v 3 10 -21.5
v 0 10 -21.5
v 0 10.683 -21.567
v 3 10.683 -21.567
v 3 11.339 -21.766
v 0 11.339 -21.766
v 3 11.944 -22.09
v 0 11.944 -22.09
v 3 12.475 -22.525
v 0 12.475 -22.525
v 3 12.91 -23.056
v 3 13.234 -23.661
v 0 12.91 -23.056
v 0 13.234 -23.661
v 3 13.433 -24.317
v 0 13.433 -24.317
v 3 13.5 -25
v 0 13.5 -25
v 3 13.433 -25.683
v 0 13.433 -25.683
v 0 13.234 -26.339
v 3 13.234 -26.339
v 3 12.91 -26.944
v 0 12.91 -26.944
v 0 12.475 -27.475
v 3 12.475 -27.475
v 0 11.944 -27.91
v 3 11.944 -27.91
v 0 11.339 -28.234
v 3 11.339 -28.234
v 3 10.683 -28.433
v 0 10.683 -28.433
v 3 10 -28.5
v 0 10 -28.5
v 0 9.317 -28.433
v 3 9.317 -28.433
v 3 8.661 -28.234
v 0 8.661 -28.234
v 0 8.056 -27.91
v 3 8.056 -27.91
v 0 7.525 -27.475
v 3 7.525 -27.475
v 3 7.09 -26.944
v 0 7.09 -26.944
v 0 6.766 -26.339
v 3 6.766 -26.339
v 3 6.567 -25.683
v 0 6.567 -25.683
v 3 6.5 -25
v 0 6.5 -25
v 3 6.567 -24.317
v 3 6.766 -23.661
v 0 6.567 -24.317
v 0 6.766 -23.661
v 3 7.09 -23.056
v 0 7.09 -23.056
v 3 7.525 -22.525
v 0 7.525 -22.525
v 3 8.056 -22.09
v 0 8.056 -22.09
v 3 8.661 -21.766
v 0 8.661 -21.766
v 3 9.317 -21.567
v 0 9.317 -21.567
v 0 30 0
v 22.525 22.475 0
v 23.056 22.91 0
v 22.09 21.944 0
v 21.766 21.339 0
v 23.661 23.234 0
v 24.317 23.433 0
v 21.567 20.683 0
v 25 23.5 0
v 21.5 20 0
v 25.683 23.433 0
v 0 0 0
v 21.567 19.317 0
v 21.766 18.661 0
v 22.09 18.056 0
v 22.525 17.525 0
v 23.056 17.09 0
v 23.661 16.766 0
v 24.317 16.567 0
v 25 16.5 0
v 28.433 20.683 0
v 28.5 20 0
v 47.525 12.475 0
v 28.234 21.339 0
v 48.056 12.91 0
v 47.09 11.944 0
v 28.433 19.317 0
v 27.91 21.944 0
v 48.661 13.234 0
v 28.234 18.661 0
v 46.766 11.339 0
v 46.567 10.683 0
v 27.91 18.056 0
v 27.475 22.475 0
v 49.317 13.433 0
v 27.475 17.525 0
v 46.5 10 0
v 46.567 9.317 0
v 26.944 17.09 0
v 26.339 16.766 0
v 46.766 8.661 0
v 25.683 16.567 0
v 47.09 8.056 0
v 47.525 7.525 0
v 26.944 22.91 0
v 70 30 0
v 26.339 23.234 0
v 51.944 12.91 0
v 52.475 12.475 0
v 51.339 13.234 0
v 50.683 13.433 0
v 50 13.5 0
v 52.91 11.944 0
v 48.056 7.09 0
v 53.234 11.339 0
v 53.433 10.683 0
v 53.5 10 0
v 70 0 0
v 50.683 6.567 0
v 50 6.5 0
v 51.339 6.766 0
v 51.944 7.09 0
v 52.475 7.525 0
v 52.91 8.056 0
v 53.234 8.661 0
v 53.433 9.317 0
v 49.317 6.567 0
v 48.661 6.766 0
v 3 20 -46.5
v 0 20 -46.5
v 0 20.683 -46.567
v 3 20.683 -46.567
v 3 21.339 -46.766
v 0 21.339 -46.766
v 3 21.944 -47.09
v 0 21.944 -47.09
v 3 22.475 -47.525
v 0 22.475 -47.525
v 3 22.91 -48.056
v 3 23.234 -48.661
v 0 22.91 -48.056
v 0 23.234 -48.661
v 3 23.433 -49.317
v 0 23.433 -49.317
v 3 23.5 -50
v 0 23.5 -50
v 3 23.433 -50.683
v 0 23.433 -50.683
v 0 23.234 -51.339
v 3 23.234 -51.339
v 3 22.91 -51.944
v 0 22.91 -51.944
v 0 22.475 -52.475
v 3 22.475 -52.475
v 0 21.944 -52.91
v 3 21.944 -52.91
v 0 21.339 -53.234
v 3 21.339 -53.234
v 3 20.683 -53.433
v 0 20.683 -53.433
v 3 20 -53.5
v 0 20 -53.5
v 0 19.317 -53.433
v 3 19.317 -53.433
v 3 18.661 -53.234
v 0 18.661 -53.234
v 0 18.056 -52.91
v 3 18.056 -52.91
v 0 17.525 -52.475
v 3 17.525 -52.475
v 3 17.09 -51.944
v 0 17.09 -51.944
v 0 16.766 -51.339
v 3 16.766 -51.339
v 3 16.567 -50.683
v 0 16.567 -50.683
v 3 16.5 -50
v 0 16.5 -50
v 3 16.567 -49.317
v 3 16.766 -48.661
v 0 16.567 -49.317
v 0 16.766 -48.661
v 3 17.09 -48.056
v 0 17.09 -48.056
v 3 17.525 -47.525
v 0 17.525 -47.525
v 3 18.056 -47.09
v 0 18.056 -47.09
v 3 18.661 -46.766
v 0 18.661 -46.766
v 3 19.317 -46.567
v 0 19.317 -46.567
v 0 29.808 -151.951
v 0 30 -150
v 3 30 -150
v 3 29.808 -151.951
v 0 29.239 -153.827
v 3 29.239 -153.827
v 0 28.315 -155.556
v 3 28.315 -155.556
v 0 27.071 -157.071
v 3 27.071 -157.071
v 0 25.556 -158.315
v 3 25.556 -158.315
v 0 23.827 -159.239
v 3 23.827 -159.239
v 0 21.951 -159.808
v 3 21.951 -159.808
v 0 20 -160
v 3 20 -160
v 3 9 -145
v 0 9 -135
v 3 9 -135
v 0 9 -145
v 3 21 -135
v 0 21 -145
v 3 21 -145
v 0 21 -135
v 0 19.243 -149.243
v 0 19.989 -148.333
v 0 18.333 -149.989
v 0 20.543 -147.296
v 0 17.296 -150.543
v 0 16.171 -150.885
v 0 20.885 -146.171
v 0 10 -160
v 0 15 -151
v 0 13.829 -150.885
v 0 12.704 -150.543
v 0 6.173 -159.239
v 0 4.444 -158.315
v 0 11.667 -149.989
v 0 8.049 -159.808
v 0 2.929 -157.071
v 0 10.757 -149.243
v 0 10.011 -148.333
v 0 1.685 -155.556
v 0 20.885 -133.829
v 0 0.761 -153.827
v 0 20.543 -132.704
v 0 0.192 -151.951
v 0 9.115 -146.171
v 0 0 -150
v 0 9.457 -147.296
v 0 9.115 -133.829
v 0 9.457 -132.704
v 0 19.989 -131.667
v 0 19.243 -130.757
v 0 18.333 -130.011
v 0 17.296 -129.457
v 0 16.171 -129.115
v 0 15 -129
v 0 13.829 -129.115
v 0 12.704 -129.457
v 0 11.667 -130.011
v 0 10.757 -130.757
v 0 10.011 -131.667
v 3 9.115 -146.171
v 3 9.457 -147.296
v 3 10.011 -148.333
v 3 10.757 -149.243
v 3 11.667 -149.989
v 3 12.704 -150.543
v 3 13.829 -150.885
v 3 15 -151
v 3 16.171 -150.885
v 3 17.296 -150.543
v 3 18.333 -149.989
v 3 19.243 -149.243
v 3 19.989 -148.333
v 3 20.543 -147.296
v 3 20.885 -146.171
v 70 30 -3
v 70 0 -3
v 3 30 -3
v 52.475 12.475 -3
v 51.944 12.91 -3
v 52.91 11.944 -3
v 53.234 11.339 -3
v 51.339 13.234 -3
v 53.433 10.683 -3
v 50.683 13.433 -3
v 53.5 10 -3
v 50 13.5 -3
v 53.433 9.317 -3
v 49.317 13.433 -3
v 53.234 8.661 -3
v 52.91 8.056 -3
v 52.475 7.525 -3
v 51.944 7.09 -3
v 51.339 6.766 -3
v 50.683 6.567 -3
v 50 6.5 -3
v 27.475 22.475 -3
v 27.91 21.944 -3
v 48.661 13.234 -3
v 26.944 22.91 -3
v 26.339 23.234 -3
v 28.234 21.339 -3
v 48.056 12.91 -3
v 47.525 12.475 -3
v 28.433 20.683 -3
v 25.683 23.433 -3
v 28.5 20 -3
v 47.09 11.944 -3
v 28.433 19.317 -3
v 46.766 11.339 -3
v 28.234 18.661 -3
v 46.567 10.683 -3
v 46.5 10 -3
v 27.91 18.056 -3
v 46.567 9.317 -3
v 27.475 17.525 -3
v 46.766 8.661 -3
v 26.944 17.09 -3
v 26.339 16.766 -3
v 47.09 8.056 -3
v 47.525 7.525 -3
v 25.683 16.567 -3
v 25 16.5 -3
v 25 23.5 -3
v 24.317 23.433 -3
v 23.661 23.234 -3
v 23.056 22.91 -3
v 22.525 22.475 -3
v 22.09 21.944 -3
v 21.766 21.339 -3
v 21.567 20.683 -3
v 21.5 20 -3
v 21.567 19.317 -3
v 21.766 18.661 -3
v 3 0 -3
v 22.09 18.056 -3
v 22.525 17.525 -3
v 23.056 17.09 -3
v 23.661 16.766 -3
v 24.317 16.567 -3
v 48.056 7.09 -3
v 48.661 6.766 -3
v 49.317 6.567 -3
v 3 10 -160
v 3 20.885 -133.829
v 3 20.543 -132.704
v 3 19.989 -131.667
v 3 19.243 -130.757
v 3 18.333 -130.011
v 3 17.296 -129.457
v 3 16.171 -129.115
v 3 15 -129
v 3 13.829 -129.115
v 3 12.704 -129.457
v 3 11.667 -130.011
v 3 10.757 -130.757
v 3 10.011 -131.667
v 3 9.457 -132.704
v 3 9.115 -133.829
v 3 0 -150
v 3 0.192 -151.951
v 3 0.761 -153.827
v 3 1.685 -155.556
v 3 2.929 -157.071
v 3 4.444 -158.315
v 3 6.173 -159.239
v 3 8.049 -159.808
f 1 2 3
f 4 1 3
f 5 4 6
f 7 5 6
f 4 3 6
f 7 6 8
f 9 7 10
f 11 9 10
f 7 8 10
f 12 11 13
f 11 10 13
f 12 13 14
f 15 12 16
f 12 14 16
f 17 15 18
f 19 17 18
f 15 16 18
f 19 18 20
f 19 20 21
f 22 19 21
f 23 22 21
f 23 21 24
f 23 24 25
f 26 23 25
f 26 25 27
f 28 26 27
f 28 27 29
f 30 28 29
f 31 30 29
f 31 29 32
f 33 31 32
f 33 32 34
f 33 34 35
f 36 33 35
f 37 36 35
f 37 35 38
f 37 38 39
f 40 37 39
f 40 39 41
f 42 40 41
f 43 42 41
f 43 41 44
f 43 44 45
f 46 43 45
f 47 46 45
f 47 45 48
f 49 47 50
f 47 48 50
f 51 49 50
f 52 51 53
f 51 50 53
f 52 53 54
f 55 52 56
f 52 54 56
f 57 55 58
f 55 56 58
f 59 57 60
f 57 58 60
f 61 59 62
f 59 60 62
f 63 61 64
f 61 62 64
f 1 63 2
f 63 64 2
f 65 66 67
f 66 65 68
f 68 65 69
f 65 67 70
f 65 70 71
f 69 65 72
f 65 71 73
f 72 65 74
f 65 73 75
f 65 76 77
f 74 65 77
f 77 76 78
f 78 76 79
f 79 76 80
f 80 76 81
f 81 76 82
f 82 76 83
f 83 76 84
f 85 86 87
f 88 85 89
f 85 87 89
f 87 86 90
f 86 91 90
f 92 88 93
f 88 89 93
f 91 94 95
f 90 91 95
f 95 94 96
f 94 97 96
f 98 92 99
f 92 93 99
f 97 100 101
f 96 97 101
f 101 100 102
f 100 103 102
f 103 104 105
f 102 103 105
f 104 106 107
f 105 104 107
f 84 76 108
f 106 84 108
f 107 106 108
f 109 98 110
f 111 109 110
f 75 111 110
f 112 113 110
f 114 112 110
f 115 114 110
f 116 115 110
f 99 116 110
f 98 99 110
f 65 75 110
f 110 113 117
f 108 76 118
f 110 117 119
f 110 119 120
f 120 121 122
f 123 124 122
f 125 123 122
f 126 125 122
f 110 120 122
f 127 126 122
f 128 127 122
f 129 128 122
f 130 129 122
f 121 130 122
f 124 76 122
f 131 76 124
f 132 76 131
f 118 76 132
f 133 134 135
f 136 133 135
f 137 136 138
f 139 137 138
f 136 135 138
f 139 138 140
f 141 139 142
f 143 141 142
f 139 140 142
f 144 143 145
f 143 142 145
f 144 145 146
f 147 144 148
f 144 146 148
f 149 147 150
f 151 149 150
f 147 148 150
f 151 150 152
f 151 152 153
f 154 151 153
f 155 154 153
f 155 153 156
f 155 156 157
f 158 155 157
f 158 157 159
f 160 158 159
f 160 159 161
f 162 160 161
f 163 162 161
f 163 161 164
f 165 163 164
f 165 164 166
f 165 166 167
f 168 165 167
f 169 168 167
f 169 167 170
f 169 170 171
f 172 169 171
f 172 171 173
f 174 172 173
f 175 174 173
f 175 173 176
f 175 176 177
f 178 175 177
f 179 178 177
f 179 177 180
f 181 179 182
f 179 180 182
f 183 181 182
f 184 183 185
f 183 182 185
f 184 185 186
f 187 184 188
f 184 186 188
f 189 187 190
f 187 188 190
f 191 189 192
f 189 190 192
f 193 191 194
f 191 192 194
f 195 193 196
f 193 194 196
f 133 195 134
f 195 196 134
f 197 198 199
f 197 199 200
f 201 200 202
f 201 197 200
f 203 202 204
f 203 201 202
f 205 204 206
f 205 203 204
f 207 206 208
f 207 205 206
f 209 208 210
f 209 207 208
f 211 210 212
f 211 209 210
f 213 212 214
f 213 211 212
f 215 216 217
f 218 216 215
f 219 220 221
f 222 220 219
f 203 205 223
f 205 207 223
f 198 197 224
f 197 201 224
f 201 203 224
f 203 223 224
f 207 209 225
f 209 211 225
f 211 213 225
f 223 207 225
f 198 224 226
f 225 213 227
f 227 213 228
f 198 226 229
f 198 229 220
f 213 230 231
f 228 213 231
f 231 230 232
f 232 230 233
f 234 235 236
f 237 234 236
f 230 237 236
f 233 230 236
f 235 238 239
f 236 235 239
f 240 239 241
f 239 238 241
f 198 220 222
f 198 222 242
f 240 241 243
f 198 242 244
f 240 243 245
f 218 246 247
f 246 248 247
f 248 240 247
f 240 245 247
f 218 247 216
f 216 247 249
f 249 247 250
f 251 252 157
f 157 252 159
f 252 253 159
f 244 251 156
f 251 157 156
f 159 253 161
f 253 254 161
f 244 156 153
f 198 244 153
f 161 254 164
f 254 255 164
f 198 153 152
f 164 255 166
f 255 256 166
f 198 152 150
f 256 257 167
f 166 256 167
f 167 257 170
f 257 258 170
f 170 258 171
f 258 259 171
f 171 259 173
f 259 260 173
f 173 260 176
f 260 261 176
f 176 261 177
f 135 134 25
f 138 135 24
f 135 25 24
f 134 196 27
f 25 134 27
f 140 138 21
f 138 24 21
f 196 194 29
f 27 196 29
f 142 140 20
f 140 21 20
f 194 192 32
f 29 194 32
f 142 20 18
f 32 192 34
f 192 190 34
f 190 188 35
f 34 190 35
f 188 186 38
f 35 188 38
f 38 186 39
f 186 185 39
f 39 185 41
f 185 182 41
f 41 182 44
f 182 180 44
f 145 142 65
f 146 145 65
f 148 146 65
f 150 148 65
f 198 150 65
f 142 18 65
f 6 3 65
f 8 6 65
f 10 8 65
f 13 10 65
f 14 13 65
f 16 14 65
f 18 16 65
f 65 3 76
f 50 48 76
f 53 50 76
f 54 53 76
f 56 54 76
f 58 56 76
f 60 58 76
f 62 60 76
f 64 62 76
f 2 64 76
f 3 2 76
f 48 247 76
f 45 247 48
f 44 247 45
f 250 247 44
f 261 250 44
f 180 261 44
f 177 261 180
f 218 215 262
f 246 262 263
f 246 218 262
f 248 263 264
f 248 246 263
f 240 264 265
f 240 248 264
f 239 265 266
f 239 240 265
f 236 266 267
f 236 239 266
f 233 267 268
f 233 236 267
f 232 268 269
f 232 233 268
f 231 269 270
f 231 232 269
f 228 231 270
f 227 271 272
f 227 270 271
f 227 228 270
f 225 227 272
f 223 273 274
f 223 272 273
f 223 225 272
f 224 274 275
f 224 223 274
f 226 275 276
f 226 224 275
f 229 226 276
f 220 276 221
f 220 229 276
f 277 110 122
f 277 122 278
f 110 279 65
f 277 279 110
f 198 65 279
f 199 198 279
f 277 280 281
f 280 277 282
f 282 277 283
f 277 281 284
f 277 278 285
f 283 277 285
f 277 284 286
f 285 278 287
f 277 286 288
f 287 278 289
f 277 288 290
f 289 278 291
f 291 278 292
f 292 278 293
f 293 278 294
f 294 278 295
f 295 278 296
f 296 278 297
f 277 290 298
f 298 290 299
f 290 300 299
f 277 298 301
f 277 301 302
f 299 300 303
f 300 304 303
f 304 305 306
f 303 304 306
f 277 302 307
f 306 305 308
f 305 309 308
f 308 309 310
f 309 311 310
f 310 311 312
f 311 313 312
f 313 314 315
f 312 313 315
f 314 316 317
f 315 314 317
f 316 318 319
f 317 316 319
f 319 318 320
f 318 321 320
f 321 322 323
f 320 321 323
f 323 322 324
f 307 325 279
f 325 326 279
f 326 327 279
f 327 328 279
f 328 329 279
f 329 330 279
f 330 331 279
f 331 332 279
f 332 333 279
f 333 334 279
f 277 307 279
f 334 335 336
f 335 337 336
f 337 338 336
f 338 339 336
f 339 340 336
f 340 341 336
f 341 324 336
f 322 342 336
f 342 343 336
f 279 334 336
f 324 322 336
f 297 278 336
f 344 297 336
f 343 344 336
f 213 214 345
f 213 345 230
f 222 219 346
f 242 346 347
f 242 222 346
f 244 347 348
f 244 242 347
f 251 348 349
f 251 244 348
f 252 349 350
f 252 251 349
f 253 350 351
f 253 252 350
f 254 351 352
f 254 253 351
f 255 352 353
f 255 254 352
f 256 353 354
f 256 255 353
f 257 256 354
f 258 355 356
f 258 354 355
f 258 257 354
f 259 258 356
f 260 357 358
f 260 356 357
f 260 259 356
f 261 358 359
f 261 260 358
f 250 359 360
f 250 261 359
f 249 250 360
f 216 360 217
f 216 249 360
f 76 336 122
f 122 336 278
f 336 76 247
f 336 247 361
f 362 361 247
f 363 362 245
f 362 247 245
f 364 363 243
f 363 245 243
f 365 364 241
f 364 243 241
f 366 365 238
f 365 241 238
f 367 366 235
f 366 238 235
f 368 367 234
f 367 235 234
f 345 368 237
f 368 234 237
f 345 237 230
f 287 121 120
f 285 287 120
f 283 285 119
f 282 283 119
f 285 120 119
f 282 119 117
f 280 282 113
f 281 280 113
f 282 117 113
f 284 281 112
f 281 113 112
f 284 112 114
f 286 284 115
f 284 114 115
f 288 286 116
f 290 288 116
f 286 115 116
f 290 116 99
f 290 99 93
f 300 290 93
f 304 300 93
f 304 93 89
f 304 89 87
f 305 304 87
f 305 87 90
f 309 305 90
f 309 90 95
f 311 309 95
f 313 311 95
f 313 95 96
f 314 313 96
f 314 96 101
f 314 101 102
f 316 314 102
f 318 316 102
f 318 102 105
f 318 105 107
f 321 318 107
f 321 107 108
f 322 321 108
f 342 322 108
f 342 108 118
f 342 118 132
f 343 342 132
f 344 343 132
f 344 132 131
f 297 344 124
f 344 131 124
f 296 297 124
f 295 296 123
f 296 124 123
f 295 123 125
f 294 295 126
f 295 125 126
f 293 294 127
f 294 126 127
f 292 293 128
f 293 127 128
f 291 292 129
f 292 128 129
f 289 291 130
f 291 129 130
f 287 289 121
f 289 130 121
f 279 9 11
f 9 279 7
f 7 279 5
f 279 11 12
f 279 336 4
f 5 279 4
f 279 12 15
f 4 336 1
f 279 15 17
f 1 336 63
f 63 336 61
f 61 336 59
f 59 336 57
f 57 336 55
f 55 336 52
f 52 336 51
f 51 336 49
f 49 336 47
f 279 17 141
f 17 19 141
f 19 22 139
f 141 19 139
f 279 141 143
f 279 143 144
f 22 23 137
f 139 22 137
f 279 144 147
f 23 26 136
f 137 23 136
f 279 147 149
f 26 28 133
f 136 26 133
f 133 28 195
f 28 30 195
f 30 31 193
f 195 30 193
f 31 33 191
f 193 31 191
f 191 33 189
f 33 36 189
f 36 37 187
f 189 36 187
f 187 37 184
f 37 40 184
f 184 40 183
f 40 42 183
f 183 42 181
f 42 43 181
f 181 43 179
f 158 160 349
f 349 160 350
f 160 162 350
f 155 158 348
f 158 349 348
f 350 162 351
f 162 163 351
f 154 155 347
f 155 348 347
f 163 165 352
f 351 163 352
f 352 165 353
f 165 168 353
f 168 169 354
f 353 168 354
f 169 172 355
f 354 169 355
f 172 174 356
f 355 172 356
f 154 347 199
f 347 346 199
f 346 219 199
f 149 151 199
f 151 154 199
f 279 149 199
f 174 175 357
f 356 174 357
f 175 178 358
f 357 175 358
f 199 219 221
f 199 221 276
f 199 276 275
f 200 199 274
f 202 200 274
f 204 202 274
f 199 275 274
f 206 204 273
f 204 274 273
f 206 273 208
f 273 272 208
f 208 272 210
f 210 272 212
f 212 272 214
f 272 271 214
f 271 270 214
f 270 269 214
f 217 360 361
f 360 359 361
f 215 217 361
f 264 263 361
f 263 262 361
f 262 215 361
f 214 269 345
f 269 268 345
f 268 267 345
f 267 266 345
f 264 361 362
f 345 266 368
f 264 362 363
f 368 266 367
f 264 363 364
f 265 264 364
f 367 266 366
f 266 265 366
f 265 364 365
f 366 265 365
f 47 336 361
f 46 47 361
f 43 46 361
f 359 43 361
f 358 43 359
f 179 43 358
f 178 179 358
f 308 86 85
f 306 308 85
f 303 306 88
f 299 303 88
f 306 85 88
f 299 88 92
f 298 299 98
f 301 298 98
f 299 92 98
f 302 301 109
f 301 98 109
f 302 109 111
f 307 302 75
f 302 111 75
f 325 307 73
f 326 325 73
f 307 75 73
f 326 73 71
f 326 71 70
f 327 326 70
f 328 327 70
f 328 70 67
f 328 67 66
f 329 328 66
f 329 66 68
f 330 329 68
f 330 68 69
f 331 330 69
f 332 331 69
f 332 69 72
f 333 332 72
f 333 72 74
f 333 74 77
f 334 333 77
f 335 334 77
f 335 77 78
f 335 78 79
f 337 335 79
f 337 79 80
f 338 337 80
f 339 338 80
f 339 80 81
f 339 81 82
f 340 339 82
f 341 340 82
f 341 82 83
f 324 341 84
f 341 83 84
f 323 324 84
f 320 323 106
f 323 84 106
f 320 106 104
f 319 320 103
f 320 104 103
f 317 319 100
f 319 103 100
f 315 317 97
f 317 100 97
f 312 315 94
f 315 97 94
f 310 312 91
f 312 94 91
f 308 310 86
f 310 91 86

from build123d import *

# Parameters (mm, degrees)
EXTRUDE_1_DEPTH     = 30
SKETCH_2_R          = 3.5
CUT_EXTRUDE_1_DEPTH = 71
SKETCH_3_R          = 3.5
CUT_EXTRUDE_2_DEPTH = 161
CUT_EXTRUDE_3_DEPTH = 71


with BuildPart() as part:
    # Эскиз1 → Вытянуть-Тонкостенный1 (new body)
    with BuildSketch(Plane(origin=(0, 0, 0), x_dir=(1, 0, 0), z_dir=(0, 1, 0))):
        Polygon((0, 160), (0, 120), (0, 0), (70, 0), (70, 3), (3, 3), (3, 120), (3, 160), align=None)
    extrude(amount=EXTRUDE_1_DEPTH)

    # Эскиз2 → Вырез-Вытянуть1 (cut, through all)
    with BuildSketch(Plane.ZY):
        with Locations((-50, 20)):
            Circle(SKETCH_2_R)
        with Locations((-25, 10)):
            Circle(SKETCH_2_R)
    extrude(amount=-CUT_EXTRUDE_1_DEPTH, mode=Mode.SUBTRACT)

    # Эскиз3 → Вырез-Вытянуть2 (cut, through all)
    with BuildSketch(Plane.XY):
        with Locations((25, 20)):
            Circle(SKETCH_3_R)
        with Locations((50, 10)):
            Circle(SKETCH_3_R)
    extrude(amount=-CUT_EXTRUDE_2_DEPTH, mode=Mode.SUBTRACT)

    # Эскиз4 → Вырез-Вытянуть3 (cut, through all)
    with BuildSketch(Plane.ZY):
        with BuildLine():
            Line((-145, 21), (-135, 21))
            ThreePointArc((-135, 21), (-129, 15), (-135, 9))
            Line((-135, 9), (-145, 9))
            ThreePointArc((-145, 9), (-151, 15), (-145, 21))
        make_face()
        with BuildLine():
            Line((-160, 20), (-160, 30))
            Line((-160, 30), (-150, 30))
            ThreePointArc((-150, 30), (-157.071067812, 27.071067812), (-160, 20))
        make_face()
        with BuildLine():
            Line((-160, 10), (-160, 0))
            Line((-160, 0), (-150, 0))
            ThreePointArc((-150, 0), (-157.071067812, 2.928932188), (-160, 10))
        make_face()
    extrude(amount=-CUT_EXTRUDE_3_DEPTH, mode=Mode.SUBTRACT)


solid = part.part
